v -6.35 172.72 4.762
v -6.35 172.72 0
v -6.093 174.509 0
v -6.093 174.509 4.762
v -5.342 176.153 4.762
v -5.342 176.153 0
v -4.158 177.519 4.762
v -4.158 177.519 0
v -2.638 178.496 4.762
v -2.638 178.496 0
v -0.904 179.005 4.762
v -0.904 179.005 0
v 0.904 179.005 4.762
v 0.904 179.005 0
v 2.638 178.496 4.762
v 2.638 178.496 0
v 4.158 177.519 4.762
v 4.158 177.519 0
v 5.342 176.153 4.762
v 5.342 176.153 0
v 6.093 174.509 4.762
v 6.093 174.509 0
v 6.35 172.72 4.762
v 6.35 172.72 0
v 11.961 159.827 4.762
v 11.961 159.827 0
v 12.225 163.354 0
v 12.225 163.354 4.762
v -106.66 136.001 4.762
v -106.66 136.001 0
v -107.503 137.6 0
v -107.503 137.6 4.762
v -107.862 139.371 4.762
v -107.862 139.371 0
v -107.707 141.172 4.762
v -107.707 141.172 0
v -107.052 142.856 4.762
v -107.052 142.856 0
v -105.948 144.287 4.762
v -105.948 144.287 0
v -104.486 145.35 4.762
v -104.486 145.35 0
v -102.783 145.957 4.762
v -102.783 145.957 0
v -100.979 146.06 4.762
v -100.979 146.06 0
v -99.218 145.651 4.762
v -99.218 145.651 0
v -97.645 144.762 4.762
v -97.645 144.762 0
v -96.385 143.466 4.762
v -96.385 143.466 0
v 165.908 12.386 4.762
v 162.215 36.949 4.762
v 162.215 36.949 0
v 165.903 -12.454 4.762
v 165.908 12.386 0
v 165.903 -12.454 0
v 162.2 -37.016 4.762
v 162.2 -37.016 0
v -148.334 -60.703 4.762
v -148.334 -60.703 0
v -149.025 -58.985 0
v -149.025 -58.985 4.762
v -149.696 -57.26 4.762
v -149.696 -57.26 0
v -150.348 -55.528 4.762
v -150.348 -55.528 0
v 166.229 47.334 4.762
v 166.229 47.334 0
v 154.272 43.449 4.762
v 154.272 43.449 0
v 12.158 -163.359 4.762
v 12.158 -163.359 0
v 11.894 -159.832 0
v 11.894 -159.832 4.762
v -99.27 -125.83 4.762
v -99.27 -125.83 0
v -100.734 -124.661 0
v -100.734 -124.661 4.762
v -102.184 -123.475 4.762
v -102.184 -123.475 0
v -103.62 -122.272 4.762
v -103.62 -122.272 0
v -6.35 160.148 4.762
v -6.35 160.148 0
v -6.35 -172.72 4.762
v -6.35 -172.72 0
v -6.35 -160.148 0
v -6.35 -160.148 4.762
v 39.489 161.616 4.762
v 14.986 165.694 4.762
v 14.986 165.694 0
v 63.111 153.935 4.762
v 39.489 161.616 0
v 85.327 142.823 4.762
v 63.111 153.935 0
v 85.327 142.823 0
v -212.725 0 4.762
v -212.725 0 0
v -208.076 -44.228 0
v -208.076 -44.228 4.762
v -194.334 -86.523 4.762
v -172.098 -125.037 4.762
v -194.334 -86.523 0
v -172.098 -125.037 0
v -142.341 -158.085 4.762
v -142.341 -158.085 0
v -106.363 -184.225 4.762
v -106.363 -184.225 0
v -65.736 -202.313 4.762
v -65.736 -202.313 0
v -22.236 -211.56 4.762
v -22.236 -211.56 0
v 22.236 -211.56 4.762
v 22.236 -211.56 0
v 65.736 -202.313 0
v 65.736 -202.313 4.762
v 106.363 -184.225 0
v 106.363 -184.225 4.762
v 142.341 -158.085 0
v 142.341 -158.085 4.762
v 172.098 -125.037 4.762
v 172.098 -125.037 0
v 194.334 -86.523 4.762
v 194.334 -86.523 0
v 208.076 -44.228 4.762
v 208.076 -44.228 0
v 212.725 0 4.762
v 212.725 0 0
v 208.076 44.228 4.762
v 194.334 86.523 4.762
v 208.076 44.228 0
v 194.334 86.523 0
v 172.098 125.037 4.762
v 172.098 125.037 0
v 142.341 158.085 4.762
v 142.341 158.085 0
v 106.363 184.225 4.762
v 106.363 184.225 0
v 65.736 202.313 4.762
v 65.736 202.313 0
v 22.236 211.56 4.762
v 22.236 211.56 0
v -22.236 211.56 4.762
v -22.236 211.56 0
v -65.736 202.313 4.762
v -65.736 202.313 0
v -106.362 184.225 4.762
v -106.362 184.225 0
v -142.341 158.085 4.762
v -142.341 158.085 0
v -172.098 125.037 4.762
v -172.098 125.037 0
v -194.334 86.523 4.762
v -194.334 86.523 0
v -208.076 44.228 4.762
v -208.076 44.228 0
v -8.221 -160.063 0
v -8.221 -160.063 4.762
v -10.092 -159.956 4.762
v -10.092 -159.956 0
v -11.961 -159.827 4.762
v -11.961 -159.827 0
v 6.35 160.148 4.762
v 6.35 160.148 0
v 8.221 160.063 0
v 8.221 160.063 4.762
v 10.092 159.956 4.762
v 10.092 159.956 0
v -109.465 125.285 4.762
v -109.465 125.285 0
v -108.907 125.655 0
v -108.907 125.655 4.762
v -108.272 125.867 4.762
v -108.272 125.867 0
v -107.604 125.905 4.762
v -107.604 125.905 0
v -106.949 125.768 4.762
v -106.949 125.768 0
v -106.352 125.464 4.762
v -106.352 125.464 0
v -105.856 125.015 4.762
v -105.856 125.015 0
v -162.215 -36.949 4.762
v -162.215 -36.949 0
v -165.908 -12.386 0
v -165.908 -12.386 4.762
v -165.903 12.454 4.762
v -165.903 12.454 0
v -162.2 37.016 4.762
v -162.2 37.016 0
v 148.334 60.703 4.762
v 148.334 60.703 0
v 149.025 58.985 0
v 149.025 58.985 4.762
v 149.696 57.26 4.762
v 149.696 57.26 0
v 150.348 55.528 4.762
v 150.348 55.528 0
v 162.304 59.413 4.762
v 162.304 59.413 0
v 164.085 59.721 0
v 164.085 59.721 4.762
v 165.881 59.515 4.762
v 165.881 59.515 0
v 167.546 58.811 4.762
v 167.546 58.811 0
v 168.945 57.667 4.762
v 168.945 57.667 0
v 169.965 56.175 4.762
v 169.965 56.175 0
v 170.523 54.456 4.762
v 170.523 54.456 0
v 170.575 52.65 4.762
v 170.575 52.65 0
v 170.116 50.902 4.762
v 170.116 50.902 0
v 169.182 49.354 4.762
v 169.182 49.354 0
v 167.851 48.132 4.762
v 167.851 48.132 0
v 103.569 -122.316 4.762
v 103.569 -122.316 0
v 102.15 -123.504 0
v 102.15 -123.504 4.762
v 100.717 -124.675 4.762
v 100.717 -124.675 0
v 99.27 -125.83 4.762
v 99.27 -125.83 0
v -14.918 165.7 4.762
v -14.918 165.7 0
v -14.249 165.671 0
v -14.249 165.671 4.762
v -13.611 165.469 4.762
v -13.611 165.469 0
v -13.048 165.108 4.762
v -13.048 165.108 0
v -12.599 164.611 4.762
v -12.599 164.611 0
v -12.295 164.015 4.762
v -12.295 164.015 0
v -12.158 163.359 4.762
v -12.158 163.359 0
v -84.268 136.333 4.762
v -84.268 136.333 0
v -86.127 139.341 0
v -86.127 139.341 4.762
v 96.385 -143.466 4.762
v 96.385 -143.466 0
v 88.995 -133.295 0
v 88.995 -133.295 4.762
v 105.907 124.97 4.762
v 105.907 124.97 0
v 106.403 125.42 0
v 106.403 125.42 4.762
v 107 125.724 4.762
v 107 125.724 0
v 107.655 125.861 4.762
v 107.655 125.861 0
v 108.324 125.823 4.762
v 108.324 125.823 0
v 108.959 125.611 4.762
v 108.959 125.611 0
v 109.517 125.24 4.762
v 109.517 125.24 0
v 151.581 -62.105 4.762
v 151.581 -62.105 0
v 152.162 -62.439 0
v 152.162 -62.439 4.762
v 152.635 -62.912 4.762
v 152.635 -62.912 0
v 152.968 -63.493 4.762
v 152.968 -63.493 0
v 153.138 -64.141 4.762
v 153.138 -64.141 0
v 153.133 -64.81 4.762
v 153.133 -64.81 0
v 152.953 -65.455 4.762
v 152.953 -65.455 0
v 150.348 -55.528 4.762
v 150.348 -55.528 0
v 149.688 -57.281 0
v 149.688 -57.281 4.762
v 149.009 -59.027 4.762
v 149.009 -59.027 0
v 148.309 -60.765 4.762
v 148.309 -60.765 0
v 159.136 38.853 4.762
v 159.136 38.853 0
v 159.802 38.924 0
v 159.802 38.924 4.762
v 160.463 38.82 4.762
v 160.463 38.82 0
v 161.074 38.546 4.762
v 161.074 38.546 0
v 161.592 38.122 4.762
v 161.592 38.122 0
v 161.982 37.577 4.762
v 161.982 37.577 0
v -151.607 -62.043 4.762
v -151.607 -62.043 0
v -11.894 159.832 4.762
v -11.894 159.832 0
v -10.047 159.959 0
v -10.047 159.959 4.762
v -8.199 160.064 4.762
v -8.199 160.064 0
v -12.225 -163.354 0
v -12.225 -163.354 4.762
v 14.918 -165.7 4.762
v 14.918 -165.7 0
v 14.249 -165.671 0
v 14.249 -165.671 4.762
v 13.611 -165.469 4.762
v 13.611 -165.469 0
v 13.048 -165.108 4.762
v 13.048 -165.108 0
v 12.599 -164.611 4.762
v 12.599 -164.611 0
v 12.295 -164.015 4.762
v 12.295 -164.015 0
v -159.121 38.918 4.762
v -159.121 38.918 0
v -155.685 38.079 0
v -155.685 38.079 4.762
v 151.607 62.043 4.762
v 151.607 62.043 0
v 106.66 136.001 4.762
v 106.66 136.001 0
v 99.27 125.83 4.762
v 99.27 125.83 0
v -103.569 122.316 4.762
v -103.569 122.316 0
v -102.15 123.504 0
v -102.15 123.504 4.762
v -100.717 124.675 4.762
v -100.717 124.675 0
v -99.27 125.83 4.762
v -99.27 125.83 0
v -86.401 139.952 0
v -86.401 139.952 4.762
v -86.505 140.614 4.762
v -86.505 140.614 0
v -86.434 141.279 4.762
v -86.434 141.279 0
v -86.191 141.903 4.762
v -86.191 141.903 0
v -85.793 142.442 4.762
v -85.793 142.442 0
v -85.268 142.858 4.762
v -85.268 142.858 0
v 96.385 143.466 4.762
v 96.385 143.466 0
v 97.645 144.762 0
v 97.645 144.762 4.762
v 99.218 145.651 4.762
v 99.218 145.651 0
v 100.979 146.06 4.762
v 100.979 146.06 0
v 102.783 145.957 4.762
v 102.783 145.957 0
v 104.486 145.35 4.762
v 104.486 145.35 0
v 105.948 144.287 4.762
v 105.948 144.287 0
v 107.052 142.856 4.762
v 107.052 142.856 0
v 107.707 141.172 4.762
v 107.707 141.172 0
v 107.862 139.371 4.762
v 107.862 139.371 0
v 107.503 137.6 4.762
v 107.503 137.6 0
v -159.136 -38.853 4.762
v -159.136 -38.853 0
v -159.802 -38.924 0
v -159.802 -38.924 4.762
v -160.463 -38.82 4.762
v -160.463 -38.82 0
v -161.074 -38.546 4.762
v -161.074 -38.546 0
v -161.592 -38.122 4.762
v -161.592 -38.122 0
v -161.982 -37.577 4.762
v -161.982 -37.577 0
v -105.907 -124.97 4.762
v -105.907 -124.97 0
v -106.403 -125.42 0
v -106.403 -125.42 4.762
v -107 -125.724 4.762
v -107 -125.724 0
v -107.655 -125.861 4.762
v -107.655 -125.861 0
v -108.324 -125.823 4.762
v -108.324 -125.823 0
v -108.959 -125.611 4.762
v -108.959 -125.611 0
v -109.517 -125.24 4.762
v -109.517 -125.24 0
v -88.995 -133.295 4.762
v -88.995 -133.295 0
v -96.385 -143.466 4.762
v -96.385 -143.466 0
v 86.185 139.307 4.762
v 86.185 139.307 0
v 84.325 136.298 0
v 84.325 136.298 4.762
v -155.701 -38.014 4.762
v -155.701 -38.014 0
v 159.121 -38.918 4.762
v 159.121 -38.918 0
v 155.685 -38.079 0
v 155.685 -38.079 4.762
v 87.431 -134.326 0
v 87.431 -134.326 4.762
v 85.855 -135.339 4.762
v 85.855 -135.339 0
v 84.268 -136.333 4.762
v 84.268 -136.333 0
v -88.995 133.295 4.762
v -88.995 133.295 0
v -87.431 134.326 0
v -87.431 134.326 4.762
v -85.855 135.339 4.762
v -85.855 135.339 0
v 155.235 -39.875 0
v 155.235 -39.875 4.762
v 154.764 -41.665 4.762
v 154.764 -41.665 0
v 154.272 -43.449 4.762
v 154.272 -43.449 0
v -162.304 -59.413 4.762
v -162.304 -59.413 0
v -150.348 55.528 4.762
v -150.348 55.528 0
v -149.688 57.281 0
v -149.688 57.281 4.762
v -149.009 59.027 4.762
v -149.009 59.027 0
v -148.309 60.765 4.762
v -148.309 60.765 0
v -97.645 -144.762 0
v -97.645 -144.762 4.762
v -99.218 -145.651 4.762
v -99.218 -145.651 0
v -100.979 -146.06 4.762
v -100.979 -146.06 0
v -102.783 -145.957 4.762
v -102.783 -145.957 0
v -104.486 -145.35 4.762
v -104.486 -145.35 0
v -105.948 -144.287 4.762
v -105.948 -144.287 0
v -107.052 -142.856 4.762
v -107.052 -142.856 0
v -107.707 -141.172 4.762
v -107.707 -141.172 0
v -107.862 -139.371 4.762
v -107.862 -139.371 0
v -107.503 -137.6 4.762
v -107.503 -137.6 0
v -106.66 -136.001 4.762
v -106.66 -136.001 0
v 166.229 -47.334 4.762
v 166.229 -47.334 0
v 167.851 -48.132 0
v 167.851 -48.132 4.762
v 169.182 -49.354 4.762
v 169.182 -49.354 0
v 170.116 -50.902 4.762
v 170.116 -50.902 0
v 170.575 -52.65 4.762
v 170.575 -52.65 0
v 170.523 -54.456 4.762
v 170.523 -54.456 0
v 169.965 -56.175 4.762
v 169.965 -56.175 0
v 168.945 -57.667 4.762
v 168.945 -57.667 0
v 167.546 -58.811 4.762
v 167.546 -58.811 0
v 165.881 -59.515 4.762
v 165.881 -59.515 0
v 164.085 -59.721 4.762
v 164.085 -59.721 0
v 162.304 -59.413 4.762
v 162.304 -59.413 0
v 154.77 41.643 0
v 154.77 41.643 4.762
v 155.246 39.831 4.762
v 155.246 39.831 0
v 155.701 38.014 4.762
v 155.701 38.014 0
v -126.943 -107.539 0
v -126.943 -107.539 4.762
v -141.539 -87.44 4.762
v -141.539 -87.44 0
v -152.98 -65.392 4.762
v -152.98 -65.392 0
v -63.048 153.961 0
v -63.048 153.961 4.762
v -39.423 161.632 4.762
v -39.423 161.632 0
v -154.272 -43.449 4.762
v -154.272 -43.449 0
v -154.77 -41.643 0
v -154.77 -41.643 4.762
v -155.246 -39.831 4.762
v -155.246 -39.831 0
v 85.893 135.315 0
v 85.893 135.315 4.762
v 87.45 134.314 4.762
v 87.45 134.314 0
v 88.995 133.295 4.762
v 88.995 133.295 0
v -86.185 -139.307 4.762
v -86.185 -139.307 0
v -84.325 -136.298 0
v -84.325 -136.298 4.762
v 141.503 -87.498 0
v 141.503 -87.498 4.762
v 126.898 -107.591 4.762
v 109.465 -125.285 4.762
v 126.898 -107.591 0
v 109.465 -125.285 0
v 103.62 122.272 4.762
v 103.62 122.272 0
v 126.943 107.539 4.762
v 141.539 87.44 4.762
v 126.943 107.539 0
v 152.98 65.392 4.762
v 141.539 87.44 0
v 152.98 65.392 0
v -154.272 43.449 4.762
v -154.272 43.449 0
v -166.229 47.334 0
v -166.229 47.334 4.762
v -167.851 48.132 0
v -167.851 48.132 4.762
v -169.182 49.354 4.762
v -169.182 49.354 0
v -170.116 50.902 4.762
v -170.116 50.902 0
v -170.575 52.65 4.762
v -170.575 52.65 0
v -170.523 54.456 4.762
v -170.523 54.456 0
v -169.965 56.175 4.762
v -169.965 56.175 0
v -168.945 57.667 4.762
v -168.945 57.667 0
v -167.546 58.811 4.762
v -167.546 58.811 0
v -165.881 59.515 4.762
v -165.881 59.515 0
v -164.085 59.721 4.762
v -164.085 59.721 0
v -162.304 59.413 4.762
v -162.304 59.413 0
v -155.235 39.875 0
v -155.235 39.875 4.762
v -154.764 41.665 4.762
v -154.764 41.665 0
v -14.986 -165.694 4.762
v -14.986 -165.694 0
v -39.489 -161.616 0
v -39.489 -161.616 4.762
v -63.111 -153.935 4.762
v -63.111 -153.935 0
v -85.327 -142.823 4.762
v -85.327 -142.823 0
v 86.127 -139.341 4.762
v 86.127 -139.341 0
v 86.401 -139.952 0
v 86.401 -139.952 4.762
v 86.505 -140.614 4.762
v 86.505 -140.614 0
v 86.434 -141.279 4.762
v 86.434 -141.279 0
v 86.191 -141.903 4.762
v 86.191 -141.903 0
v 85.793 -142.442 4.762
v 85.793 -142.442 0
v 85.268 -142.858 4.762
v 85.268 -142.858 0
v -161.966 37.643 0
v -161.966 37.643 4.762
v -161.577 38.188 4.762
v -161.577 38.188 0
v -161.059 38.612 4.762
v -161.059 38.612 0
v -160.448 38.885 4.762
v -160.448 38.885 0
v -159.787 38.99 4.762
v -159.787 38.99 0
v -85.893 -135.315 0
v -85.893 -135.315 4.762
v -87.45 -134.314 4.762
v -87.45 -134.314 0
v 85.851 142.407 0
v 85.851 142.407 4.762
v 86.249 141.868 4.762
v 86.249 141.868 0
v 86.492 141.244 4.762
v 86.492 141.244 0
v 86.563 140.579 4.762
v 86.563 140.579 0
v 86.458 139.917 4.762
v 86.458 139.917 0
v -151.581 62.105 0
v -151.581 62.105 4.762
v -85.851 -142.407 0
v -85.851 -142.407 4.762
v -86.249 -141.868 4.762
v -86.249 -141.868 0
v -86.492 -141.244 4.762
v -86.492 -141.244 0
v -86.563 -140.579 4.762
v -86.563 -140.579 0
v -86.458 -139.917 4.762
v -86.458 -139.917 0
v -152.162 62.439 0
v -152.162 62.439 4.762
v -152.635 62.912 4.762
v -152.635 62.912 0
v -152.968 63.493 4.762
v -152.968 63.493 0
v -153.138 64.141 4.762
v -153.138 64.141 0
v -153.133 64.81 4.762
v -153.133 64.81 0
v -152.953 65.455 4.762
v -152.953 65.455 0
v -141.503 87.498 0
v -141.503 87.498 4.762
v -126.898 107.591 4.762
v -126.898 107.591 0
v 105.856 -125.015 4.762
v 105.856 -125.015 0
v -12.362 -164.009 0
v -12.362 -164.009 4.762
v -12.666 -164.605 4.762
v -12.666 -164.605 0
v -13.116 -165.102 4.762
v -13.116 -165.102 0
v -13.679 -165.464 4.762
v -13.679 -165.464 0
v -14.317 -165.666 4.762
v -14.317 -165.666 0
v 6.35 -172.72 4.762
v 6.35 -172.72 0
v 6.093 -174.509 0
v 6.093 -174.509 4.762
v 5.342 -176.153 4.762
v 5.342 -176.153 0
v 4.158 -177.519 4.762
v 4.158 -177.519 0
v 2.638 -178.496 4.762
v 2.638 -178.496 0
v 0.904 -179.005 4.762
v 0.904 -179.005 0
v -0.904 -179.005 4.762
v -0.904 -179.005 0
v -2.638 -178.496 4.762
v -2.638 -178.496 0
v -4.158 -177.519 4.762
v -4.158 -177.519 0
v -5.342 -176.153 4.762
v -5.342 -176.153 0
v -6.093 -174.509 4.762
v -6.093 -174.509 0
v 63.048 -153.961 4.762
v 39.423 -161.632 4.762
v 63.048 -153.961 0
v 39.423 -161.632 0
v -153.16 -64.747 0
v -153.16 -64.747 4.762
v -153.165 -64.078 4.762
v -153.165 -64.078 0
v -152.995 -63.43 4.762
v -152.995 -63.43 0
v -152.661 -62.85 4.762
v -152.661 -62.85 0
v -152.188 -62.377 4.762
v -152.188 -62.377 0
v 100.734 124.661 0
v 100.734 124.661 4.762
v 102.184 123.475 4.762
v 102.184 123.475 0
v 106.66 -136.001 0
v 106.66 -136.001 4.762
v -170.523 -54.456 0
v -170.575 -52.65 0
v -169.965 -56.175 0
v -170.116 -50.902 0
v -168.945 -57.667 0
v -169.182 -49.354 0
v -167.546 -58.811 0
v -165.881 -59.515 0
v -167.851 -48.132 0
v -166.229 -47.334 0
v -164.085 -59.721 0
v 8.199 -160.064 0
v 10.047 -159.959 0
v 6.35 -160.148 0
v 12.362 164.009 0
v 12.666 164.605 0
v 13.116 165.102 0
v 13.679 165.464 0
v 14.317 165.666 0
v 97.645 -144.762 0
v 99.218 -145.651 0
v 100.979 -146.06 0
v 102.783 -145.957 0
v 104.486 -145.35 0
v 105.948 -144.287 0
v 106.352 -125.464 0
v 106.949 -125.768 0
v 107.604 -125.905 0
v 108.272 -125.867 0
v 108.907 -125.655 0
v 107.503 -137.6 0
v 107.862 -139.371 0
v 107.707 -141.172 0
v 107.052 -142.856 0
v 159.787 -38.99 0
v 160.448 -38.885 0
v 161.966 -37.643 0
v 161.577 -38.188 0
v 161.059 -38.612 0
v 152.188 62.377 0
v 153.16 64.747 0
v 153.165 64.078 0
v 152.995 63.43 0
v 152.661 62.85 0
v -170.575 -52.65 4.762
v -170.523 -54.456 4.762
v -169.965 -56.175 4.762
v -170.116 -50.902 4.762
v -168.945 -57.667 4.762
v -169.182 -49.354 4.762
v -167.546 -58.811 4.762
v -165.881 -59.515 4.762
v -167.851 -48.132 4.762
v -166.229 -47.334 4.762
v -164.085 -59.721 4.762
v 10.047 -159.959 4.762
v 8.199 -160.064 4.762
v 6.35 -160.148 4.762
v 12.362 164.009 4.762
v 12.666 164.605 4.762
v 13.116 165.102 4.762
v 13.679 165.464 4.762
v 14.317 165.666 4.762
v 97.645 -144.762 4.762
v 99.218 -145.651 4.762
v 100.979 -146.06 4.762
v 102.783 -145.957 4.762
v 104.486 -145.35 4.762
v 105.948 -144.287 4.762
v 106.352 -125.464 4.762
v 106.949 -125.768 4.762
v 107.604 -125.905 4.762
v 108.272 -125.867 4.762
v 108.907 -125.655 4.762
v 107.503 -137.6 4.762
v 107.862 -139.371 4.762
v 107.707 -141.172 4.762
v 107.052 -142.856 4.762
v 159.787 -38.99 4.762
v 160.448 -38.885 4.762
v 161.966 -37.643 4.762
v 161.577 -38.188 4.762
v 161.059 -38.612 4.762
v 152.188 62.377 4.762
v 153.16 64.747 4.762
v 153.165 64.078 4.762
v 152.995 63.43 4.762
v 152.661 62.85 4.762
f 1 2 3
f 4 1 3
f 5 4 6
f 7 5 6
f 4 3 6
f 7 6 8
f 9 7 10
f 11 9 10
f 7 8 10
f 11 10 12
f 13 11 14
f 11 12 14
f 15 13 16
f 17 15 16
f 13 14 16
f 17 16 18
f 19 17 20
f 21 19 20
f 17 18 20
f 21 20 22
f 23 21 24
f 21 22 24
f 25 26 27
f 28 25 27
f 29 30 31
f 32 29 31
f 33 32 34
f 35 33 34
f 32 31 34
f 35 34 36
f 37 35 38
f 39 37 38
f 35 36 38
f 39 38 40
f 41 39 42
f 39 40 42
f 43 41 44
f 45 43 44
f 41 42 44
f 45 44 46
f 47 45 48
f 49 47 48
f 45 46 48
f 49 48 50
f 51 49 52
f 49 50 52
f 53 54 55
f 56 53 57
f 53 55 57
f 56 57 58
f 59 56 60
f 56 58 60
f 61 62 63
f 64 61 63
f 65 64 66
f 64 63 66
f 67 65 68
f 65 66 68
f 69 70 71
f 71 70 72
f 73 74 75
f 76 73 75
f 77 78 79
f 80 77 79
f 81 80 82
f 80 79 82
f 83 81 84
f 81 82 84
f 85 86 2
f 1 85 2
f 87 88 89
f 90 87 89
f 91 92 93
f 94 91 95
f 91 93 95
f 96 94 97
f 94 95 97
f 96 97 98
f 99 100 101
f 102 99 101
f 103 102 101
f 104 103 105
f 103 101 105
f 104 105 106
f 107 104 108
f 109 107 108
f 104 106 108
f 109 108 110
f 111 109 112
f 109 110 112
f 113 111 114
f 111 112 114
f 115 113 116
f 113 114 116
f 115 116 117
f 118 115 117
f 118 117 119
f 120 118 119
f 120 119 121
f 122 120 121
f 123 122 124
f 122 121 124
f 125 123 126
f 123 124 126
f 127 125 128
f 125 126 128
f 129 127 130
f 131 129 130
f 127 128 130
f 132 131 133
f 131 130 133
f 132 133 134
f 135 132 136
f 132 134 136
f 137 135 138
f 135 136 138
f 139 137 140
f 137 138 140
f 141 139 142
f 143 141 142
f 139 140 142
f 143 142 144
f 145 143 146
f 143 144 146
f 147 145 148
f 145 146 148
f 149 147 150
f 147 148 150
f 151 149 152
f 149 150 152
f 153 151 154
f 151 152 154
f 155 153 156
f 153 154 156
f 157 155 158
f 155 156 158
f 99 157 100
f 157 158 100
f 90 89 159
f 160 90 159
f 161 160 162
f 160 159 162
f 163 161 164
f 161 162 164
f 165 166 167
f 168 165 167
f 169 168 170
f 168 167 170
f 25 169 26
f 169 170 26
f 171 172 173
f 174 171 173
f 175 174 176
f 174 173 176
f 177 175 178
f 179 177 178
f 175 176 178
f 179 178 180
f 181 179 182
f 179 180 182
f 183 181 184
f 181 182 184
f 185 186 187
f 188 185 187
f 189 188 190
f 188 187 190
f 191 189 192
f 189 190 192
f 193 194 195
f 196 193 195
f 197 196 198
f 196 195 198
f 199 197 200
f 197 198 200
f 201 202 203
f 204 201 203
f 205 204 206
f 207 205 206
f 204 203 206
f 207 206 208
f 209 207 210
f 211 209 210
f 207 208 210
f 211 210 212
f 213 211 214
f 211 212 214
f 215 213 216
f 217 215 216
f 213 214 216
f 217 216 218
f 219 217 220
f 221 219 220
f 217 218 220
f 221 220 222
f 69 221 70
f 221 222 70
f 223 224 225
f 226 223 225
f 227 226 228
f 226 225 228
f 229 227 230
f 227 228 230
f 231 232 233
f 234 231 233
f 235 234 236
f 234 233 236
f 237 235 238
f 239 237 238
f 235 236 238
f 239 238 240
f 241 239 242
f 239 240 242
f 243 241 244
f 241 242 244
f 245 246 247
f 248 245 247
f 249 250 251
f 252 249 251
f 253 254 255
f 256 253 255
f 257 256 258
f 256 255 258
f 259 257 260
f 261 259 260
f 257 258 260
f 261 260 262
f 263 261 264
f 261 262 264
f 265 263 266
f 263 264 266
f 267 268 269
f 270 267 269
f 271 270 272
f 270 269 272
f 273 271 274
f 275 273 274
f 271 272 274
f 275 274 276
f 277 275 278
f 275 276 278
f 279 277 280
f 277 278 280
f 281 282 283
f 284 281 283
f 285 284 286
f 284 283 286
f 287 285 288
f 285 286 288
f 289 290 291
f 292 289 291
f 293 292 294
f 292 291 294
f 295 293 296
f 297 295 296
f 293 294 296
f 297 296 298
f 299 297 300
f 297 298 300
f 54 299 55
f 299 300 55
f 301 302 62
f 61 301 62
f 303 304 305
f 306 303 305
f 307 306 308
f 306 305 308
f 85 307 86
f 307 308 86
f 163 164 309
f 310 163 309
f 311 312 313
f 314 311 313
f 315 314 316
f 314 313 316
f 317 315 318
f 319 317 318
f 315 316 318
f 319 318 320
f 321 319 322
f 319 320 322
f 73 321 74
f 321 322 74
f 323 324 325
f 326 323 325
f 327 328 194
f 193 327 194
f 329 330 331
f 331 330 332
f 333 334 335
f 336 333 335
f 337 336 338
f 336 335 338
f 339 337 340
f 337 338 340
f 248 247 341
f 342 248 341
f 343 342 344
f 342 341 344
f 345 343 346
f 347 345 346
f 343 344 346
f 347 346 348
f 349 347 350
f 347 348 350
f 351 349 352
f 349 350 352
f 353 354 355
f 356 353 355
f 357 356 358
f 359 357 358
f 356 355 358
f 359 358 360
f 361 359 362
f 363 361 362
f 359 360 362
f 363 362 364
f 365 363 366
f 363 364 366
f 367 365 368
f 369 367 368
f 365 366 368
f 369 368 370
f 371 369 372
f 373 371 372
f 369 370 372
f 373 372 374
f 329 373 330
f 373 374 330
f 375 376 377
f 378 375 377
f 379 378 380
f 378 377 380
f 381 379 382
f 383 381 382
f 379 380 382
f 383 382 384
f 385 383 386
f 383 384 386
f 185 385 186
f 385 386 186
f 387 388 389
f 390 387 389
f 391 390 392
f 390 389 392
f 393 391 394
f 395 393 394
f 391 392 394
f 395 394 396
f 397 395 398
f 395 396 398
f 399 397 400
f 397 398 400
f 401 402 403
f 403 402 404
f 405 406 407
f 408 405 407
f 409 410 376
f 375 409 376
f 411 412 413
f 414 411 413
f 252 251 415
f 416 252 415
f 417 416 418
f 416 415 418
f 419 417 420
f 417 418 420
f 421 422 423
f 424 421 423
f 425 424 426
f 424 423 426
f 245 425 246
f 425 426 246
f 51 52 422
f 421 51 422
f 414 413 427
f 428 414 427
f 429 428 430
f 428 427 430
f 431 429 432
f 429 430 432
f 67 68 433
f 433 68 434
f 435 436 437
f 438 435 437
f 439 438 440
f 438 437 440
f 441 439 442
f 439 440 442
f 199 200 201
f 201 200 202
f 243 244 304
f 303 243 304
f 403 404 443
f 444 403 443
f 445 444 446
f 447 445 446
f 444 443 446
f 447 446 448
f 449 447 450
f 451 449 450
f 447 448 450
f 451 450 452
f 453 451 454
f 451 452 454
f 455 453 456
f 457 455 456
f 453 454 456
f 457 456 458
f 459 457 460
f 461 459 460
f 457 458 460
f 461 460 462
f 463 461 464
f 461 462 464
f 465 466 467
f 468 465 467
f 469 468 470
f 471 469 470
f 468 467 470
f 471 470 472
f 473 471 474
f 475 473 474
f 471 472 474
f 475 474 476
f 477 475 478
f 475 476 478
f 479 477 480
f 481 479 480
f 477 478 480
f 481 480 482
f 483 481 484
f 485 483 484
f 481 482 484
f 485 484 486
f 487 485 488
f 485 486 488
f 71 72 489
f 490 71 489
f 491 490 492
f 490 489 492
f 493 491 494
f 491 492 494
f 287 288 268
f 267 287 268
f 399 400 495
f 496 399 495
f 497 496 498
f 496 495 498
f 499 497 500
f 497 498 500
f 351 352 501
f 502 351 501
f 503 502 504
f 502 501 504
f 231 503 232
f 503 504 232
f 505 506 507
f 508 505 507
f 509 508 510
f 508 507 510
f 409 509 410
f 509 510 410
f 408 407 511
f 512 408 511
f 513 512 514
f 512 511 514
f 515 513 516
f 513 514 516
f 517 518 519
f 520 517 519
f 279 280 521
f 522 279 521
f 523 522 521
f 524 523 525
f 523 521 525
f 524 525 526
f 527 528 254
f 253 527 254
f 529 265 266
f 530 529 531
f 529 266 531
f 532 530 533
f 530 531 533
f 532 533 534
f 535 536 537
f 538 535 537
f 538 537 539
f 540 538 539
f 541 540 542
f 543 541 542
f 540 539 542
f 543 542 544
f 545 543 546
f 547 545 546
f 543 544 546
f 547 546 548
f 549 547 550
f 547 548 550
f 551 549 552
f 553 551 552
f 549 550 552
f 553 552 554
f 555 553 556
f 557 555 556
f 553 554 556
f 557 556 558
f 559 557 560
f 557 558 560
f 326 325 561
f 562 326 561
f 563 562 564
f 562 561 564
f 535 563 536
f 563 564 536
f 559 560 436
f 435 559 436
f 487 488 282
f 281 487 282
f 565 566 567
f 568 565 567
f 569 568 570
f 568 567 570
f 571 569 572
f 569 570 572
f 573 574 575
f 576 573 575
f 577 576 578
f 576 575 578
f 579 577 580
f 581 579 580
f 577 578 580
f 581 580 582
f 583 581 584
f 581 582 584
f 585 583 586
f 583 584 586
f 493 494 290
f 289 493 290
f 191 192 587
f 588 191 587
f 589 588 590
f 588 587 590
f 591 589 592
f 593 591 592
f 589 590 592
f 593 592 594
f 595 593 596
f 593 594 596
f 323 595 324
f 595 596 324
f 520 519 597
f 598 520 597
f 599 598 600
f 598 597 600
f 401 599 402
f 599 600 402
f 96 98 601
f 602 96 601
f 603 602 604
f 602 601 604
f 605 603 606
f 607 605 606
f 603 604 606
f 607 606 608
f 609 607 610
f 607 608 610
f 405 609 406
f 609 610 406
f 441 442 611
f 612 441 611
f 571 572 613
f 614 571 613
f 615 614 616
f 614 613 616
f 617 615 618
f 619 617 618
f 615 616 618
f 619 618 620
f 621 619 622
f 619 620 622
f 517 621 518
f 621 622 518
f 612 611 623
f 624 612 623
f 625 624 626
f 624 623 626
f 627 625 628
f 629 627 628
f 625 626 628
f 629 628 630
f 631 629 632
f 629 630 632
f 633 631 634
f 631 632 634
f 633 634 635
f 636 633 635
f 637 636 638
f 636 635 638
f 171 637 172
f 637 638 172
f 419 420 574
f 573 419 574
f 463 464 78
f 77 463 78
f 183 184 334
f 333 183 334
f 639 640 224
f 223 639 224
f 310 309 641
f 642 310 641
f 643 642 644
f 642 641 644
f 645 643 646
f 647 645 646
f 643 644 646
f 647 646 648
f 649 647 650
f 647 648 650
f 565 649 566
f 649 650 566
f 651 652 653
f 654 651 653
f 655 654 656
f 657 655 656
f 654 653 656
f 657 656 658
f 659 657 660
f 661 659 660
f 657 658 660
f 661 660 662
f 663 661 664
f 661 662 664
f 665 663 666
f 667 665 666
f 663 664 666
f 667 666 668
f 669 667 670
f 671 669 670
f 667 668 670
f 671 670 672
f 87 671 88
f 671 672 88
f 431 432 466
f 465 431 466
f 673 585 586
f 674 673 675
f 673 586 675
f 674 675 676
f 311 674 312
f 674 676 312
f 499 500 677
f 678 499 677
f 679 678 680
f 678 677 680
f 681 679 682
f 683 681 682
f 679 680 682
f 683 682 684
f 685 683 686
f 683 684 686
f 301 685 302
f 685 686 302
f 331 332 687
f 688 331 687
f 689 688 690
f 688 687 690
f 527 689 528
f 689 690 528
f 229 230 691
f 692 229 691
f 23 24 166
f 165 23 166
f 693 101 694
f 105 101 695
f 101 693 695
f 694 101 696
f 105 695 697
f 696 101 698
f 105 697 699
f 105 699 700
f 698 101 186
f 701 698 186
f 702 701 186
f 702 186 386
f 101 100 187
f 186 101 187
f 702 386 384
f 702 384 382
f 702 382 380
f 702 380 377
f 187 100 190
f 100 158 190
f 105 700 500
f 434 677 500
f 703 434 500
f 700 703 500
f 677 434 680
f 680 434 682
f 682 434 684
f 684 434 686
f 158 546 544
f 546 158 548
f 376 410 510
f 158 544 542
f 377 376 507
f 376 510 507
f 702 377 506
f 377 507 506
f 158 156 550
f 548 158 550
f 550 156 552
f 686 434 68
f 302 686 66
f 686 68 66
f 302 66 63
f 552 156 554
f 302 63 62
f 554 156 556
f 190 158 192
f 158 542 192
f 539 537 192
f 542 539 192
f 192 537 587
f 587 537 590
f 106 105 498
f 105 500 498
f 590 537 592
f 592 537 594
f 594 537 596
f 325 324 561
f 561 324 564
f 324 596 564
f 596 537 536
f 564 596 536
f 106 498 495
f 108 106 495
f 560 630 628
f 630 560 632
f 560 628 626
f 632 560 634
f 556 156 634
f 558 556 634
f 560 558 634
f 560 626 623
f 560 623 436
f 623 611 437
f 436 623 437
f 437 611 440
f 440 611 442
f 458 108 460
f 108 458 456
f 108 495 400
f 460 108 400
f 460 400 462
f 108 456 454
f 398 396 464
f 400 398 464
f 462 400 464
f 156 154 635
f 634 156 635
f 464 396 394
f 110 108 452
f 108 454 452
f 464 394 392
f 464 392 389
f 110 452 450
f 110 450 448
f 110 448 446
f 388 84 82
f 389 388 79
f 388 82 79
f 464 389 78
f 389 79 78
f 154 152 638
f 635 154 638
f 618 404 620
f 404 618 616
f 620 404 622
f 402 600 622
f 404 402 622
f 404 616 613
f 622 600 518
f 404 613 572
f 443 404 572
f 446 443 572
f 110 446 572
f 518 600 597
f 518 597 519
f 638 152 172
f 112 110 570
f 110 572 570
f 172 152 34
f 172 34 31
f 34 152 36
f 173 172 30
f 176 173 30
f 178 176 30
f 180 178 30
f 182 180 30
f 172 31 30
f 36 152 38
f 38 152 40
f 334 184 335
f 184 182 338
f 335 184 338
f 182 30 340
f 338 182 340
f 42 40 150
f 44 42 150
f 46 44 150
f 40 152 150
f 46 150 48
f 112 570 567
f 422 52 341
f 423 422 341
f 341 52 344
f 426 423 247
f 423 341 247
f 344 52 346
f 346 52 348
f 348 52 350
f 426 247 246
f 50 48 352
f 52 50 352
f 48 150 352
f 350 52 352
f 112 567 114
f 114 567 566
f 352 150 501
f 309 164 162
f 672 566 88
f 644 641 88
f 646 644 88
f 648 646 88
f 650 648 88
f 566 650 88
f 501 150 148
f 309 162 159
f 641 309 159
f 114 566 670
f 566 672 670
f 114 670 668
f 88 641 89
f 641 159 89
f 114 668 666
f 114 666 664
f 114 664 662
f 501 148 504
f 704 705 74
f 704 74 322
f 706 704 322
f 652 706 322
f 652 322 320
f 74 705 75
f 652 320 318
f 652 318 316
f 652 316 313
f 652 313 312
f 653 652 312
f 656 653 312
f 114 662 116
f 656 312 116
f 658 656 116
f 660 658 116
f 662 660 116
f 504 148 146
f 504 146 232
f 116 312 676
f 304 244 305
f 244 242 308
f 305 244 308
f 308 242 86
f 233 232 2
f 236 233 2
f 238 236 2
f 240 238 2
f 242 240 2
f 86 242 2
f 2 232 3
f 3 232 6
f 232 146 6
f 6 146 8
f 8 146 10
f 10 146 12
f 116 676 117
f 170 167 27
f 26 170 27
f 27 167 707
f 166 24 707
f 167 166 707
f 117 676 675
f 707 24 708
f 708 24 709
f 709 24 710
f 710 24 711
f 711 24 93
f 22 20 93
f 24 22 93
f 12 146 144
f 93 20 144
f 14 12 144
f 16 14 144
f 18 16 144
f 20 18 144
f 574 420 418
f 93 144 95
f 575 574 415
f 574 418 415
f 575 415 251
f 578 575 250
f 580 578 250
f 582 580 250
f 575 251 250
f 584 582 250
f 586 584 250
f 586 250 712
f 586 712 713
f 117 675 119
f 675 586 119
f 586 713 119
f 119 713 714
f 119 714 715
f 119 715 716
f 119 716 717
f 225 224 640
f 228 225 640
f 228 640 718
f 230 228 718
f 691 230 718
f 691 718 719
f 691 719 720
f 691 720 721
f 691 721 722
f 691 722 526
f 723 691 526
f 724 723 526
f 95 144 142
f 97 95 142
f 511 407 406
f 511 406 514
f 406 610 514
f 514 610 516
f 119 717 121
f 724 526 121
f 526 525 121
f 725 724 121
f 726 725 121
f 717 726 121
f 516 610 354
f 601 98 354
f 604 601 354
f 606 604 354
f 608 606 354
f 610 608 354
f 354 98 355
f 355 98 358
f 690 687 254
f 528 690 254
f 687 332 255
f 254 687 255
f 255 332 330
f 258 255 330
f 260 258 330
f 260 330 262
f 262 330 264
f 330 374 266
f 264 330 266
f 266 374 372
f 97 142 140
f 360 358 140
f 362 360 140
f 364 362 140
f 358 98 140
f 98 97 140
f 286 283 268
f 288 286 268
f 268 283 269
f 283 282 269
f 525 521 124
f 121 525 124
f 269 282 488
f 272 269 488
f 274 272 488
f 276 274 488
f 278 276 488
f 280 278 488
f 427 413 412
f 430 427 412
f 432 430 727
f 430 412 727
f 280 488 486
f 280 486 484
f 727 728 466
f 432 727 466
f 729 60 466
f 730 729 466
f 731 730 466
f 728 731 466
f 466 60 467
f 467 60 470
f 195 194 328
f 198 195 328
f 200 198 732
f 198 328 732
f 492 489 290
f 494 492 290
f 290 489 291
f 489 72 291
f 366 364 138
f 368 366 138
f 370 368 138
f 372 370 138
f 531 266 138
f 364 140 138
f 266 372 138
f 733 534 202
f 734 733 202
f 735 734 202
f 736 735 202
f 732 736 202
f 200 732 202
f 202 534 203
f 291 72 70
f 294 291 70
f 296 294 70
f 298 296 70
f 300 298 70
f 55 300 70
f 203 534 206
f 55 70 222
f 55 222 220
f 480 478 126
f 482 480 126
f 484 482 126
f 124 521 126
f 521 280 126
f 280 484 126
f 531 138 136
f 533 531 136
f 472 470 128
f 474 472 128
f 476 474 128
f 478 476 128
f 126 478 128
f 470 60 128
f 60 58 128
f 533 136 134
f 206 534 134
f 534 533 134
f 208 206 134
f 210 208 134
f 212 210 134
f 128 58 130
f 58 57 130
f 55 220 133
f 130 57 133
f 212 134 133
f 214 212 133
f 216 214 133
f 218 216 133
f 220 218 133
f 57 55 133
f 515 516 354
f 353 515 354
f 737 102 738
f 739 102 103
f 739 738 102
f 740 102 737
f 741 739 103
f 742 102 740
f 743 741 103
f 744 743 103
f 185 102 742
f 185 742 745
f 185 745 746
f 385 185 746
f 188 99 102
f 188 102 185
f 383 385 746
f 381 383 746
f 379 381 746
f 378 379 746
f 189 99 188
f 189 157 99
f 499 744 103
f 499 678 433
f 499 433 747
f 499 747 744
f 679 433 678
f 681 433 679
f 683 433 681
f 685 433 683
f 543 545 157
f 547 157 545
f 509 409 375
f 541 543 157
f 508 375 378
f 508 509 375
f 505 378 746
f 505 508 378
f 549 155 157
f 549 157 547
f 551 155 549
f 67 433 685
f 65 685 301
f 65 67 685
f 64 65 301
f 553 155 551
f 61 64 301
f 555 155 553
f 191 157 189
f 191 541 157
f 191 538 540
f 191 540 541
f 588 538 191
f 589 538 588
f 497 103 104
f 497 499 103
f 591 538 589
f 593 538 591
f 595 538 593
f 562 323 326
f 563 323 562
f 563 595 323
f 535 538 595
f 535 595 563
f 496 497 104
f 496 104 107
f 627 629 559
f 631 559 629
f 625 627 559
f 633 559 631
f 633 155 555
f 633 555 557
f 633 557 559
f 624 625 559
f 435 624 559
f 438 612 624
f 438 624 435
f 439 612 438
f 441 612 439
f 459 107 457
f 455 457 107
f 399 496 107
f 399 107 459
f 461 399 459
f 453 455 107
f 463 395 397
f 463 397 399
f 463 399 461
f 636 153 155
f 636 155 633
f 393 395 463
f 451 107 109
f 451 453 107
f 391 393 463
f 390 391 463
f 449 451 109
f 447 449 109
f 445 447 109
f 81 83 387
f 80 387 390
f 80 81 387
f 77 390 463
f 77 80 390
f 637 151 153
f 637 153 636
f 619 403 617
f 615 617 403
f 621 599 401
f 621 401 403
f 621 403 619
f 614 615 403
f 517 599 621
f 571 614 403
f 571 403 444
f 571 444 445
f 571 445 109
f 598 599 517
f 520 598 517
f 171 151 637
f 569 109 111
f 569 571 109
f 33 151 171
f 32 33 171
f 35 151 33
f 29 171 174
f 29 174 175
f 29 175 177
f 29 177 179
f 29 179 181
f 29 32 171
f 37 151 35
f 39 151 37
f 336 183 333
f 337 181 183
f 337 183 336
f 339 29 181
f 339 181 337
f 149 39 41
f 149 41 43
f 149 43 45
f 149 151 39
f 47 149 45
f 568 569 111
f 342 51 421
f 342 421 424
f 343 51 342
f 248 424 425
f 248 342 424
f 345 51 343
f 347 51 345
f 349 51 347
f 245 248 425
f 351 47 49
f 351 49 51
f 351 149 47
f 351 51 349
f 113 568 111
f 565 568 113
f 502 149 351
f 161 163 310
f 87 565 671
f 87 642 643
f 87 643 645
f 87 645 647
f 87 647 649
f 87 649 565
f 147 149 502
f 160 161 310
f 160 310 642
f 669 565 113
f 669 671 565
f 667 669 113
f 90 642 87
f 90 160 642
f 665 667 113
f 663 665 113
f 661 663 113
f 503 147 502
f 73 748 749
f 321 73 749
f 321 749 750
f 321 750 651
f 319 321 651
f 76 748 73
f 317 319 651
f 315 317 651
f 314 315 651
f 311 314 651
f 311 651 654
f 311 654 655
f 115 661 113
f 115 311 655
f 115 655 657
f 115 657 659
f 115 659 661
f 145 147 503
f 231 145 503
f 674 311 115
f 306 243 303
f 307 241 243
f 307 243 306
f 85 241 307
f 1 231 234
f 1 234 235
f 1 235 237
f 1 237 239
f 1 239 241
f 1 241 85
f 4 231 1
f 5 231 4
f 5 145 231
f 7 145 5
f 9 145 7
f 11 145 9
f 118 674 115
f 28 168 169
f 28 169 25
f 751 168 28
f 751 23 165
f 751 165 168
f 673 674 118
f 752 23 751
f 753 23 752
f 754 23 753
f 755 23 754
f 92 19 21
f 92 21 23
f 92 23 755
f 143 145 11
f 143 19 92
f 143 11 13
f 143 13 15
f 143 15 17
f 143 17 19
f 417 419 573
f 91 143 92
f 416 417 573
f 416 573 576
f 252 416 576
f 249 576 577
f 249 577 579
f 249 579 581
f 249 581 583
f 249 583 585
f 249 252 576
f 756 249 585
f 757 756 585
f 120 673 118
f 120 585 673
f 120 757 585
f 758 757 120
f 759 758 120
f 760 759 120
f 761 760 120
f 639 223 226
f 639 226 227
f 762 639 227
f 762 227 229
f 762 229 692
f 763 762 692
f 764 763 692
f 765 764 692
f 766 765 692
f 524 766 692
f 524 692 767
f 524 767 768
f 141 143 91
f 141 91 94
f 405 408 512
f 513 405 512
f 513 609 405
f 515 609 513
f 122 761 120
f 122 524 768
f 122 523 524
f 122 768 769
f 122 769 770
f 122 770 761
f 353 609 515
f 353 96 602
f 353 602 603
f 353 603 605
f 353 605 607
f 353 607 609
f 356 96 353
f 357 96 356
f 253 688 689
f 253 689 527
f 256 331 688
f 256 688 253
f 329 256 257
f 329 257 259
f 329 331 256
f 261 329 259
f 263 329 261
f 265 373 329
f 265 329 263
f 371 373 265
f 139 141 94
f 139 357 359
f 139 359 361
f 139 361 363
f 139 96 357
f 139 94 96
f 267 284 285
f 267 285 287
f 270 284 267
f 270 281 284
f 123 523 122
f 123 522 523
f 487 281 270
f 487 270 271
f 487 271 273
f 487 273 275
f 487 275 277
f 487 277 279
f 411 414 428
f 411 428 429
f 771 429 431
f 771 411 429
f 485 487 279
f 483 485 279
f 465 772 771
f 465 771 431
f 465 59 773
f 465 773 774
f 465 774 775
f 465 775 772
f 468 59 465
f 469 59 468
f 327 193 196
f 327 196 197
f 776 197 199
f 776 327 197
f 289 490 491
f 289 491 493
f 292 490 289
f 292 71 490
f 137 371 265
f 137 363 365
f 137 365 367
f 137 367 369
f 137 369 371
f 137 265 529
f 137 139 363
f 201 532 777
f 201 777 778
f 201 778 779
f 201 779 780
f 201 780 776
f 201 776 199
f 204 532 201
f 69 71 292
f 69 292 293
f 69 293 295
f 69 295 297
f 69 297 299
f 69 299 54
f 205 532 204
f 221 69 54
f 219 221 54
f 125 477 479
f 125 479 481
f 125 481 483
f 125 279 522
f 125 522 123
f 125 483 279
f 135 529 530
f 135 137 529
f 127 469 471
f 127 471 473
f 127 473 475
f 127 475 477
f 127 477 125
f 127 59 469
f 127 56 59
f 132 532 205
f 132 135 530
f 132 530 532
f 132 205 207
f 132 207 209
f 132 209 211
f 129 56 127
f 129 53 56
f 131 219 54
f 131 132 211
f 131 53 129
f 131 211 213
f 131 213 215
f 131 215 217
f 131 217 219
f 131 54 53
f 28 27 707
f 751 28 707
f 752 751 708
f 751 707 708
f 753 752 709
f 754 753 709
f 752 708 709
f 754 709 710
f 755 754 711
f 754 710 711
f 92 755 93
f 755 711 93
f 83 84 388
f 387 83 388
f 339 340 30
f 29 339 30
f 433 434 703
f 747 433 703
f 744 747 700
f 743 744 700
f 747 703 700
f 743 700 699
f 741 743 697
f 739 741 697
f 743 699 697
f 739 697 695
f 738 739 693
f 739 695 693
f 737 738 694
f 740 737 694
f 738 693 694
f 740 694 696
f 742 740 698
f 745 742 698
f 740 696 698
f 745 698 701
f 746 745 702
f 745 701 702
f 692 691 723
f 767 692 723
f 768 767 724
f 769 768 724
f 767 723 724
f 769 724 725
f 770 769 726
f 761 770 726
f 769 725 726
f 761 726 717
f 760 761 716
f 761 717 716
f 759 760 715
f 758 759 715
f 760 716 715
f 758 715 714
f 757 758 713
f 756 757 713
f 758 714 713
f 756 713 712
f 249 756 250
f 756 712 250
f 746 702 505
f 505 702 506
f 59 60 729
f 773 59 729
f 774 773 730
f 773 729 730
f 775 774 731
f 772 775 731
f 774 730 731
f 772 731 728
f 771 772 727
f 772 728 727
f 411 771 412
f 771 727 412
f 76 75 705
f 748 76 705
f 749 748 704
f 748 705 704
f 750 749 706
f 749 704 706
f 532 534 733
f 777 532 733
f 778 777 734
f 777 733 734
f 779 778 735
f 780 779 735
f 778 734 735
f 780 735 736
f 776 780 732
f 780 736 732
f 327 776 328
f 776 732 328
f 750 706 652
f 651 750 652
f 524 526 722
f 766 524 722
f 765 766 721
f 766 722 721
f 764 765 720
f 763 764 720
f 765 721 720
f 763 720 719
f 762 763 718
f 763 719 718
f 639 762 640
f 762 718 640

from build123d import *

# Parameters (mm, degrees)
SKETCH1_R           = 212.725
BOSS_EXTRUDE1_DEPTH = 4.7625
SKETCH8_R           = 166.37
CUT_EXTRUDE1_DEPTH  = 4.7625
CUT_EXTRUDE3_DEPTH  = 4.7625
CIRPATTERN1_COUNT   = 10
BOSS_EXTRUDE2_START = -4.7625
BOSS_EXTRUDE2_DEPTH = 4.7625
CIRPATTERN2_COUNT   = 10


with BuildPart() as part:
    # Sketch1 → Boss-Extrude1 (new body)
    with BuildSketch(Plane.XY):
        with Locations(Location((0, 0, 0), (0, 0, 180))):
            Circle(SKETCH1_R)
    extrude(amount=BOSS_EXTRUDE1_DEPTH)

    # Sketch8 → Cut-Extrude1 (cut)
    with BuildSketch(Plane(origin=(0, 0, 0), x_dir=(-1, 0, 0), z_dir=(0, 0, -1))):
        Circle(SKETCH8_R)
    extrude(amount=-CUT_EXTRUDE1_DEPTH, mode=Mode.SUBTRACT)

    # Sketch9 → Cut-Extrude3 (cut)
    with BuildSketch(Plane(origin=(0, 0, 0), x_dir=(-1, 0, 0), z_dir=(0, 0, -1))):
        with BuildLine():
            ThreePointArc((6.35, 172.72), (0, 179.07), (-6.35, 172.72))
            Line((-6.35, 172.72), (6.35, 172.72))
        make_face()
        with BuildLine():
            Line((6.35, 172.72), (-6.35, 172.72))
            ThreePointArc((-6.35, 172.72), (-4.490128088, 168.229871967), (-7.7e-08, 166.37))
            ThreePointArc((-7.7e-08, 166.37), (4.490128033, 168.229871912), (6.35, 172.72))
        make_face()
        with BuildLine():
            ThreePointArc((-7.7e-08, 166.37), (3.175578494, 166.339690397), (6.35, 166.248772627))
            Line((6.35, 166.248772627), (6.35, 172.72))
            ThreePointArc((6.35, 172.72), (4.490128033, 168.229871912), (-7.7e-08, 166.37))
        make_face()
        with BuildLine():
            Line((-6.35, 172.72), (-6.35, 166.248772627))
            ThreePointArc((-6.35, 166.248772627), (-3.175578572, 166.339690395), (-7.7e-08, 166.37))
            ThreePointArc((-7.7e-08, 166.37), (-4.490128088, 168.229871967), (-6.35, 172.72))
        make_face()
    cut_extrude3 = extrude(amount=-CUT_EXTRUDE3_DEPTH, mode=Mode.SUBTRACT)

    # CirPattern1: Cut-Extrude3 ×10 about axis
    cirpattern1_axis = Axis((0, 0, 0), (0, 0, 1))
    for i in range(1, CIRPATTERN1_COUNT):
        add(cut_extrude3.rotate(cirpattern1_axis, i * 360 / CIRPATTERN1_COUNT), mode=Mode.SUBTRACT)

    # Sketch11 → Boss-Extrude2 (add)
    with BuildSketch(Plane.XY.offset(4.7625).offset(BOSS_EXTRUDE2_START)):
        with BuildLine():
            Line((-12.157574607, 163.359431727), (-11.893810893, 159.832075437))
            ThreePointArc((-11.893810893, 159.832075437), (-9.123274415, 160.014127314), (-6.35, 160.148158204))
            Line((-6.35, 160.148158204), (-6.35, 166.248772627))
            ThreePointArc((-6.35, 166.248772627), (-10.637673325, 166.029566061), (-14.918262729, 165.699795827))
            ThreePointArc((-14.918262729, 165.699795827), (-13.048012002, 165.107506557), (-12.157574607, 163.359431727))
        make_face()
        with BuildLine():
            ThreePointArc((14.986366689, 165.693650191), (10.671793481, 166.027376429), (6.35, 166.248772627))
            Line((6.35, 166.248772627), (6.35, 160.148158204))
            ThreePointArc((6.35, 160.148158204), (9.156780546, 160.012213428), (11.960746269, 159.827080386))
            Line((11.960746269, 159.827080386), (12.224649917, 163.353528381))
            ThreePointArc((12.224649917, 163.353528381), (13.1155312, 165.101840374), (14.986366689, 165.693650191))
        make_face()
    boss_extrude2 = extrude(amount=BOSS_EXTRUDE2_DEPTH)

    # CirPattern2: Boss-Extrude2 ×10 about axis
    cirpattern2_axis = Axis((0, 0, 0), (0, 0, 1))
    for i in range(1, CIRPATTERN2_COUNT):
        add(boss_extrude2.rotate(cirpattern2_axis, i * 360 / CIRPATTERN2_COUNT))


solid = part.part
